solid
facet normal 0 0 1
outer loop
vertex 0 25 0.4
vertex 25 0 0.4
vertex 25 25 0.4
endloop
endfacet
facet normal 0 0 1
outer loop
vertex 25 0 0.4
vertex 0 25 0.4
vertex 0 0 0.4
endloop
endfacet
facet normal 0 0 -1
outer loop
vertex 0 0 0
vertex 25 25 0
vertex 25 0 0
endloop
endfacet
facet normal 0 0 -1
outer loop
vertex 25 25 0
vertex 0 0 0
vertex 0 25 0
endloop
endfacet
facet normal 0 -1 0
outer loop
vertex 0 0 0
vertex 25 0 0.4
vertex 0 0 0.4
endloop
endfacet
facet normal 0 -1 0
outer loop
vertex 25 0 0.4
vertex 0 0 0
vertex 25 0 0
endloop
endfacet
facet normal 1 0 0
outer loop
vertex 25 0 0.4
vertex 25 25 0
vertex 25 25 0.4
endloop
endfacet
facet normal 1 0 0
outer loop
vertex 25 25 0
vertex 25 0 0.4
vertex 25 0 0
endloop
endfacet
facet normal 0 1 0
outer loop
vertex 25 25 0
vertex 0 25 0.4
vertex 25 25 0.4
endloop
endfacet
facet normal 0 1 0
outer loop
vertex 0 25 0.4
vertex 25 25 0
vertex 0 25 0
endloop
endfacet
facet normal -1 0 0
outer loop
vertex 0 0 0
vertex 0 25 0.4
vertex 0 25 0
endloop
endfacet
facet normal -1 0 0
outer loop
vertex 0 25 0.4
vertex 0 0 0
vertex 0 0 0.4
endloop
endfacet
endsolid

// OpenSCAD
edge = 25;

cube(
    [edge,
    edge,
    0.4,
    ],
    center=false);
